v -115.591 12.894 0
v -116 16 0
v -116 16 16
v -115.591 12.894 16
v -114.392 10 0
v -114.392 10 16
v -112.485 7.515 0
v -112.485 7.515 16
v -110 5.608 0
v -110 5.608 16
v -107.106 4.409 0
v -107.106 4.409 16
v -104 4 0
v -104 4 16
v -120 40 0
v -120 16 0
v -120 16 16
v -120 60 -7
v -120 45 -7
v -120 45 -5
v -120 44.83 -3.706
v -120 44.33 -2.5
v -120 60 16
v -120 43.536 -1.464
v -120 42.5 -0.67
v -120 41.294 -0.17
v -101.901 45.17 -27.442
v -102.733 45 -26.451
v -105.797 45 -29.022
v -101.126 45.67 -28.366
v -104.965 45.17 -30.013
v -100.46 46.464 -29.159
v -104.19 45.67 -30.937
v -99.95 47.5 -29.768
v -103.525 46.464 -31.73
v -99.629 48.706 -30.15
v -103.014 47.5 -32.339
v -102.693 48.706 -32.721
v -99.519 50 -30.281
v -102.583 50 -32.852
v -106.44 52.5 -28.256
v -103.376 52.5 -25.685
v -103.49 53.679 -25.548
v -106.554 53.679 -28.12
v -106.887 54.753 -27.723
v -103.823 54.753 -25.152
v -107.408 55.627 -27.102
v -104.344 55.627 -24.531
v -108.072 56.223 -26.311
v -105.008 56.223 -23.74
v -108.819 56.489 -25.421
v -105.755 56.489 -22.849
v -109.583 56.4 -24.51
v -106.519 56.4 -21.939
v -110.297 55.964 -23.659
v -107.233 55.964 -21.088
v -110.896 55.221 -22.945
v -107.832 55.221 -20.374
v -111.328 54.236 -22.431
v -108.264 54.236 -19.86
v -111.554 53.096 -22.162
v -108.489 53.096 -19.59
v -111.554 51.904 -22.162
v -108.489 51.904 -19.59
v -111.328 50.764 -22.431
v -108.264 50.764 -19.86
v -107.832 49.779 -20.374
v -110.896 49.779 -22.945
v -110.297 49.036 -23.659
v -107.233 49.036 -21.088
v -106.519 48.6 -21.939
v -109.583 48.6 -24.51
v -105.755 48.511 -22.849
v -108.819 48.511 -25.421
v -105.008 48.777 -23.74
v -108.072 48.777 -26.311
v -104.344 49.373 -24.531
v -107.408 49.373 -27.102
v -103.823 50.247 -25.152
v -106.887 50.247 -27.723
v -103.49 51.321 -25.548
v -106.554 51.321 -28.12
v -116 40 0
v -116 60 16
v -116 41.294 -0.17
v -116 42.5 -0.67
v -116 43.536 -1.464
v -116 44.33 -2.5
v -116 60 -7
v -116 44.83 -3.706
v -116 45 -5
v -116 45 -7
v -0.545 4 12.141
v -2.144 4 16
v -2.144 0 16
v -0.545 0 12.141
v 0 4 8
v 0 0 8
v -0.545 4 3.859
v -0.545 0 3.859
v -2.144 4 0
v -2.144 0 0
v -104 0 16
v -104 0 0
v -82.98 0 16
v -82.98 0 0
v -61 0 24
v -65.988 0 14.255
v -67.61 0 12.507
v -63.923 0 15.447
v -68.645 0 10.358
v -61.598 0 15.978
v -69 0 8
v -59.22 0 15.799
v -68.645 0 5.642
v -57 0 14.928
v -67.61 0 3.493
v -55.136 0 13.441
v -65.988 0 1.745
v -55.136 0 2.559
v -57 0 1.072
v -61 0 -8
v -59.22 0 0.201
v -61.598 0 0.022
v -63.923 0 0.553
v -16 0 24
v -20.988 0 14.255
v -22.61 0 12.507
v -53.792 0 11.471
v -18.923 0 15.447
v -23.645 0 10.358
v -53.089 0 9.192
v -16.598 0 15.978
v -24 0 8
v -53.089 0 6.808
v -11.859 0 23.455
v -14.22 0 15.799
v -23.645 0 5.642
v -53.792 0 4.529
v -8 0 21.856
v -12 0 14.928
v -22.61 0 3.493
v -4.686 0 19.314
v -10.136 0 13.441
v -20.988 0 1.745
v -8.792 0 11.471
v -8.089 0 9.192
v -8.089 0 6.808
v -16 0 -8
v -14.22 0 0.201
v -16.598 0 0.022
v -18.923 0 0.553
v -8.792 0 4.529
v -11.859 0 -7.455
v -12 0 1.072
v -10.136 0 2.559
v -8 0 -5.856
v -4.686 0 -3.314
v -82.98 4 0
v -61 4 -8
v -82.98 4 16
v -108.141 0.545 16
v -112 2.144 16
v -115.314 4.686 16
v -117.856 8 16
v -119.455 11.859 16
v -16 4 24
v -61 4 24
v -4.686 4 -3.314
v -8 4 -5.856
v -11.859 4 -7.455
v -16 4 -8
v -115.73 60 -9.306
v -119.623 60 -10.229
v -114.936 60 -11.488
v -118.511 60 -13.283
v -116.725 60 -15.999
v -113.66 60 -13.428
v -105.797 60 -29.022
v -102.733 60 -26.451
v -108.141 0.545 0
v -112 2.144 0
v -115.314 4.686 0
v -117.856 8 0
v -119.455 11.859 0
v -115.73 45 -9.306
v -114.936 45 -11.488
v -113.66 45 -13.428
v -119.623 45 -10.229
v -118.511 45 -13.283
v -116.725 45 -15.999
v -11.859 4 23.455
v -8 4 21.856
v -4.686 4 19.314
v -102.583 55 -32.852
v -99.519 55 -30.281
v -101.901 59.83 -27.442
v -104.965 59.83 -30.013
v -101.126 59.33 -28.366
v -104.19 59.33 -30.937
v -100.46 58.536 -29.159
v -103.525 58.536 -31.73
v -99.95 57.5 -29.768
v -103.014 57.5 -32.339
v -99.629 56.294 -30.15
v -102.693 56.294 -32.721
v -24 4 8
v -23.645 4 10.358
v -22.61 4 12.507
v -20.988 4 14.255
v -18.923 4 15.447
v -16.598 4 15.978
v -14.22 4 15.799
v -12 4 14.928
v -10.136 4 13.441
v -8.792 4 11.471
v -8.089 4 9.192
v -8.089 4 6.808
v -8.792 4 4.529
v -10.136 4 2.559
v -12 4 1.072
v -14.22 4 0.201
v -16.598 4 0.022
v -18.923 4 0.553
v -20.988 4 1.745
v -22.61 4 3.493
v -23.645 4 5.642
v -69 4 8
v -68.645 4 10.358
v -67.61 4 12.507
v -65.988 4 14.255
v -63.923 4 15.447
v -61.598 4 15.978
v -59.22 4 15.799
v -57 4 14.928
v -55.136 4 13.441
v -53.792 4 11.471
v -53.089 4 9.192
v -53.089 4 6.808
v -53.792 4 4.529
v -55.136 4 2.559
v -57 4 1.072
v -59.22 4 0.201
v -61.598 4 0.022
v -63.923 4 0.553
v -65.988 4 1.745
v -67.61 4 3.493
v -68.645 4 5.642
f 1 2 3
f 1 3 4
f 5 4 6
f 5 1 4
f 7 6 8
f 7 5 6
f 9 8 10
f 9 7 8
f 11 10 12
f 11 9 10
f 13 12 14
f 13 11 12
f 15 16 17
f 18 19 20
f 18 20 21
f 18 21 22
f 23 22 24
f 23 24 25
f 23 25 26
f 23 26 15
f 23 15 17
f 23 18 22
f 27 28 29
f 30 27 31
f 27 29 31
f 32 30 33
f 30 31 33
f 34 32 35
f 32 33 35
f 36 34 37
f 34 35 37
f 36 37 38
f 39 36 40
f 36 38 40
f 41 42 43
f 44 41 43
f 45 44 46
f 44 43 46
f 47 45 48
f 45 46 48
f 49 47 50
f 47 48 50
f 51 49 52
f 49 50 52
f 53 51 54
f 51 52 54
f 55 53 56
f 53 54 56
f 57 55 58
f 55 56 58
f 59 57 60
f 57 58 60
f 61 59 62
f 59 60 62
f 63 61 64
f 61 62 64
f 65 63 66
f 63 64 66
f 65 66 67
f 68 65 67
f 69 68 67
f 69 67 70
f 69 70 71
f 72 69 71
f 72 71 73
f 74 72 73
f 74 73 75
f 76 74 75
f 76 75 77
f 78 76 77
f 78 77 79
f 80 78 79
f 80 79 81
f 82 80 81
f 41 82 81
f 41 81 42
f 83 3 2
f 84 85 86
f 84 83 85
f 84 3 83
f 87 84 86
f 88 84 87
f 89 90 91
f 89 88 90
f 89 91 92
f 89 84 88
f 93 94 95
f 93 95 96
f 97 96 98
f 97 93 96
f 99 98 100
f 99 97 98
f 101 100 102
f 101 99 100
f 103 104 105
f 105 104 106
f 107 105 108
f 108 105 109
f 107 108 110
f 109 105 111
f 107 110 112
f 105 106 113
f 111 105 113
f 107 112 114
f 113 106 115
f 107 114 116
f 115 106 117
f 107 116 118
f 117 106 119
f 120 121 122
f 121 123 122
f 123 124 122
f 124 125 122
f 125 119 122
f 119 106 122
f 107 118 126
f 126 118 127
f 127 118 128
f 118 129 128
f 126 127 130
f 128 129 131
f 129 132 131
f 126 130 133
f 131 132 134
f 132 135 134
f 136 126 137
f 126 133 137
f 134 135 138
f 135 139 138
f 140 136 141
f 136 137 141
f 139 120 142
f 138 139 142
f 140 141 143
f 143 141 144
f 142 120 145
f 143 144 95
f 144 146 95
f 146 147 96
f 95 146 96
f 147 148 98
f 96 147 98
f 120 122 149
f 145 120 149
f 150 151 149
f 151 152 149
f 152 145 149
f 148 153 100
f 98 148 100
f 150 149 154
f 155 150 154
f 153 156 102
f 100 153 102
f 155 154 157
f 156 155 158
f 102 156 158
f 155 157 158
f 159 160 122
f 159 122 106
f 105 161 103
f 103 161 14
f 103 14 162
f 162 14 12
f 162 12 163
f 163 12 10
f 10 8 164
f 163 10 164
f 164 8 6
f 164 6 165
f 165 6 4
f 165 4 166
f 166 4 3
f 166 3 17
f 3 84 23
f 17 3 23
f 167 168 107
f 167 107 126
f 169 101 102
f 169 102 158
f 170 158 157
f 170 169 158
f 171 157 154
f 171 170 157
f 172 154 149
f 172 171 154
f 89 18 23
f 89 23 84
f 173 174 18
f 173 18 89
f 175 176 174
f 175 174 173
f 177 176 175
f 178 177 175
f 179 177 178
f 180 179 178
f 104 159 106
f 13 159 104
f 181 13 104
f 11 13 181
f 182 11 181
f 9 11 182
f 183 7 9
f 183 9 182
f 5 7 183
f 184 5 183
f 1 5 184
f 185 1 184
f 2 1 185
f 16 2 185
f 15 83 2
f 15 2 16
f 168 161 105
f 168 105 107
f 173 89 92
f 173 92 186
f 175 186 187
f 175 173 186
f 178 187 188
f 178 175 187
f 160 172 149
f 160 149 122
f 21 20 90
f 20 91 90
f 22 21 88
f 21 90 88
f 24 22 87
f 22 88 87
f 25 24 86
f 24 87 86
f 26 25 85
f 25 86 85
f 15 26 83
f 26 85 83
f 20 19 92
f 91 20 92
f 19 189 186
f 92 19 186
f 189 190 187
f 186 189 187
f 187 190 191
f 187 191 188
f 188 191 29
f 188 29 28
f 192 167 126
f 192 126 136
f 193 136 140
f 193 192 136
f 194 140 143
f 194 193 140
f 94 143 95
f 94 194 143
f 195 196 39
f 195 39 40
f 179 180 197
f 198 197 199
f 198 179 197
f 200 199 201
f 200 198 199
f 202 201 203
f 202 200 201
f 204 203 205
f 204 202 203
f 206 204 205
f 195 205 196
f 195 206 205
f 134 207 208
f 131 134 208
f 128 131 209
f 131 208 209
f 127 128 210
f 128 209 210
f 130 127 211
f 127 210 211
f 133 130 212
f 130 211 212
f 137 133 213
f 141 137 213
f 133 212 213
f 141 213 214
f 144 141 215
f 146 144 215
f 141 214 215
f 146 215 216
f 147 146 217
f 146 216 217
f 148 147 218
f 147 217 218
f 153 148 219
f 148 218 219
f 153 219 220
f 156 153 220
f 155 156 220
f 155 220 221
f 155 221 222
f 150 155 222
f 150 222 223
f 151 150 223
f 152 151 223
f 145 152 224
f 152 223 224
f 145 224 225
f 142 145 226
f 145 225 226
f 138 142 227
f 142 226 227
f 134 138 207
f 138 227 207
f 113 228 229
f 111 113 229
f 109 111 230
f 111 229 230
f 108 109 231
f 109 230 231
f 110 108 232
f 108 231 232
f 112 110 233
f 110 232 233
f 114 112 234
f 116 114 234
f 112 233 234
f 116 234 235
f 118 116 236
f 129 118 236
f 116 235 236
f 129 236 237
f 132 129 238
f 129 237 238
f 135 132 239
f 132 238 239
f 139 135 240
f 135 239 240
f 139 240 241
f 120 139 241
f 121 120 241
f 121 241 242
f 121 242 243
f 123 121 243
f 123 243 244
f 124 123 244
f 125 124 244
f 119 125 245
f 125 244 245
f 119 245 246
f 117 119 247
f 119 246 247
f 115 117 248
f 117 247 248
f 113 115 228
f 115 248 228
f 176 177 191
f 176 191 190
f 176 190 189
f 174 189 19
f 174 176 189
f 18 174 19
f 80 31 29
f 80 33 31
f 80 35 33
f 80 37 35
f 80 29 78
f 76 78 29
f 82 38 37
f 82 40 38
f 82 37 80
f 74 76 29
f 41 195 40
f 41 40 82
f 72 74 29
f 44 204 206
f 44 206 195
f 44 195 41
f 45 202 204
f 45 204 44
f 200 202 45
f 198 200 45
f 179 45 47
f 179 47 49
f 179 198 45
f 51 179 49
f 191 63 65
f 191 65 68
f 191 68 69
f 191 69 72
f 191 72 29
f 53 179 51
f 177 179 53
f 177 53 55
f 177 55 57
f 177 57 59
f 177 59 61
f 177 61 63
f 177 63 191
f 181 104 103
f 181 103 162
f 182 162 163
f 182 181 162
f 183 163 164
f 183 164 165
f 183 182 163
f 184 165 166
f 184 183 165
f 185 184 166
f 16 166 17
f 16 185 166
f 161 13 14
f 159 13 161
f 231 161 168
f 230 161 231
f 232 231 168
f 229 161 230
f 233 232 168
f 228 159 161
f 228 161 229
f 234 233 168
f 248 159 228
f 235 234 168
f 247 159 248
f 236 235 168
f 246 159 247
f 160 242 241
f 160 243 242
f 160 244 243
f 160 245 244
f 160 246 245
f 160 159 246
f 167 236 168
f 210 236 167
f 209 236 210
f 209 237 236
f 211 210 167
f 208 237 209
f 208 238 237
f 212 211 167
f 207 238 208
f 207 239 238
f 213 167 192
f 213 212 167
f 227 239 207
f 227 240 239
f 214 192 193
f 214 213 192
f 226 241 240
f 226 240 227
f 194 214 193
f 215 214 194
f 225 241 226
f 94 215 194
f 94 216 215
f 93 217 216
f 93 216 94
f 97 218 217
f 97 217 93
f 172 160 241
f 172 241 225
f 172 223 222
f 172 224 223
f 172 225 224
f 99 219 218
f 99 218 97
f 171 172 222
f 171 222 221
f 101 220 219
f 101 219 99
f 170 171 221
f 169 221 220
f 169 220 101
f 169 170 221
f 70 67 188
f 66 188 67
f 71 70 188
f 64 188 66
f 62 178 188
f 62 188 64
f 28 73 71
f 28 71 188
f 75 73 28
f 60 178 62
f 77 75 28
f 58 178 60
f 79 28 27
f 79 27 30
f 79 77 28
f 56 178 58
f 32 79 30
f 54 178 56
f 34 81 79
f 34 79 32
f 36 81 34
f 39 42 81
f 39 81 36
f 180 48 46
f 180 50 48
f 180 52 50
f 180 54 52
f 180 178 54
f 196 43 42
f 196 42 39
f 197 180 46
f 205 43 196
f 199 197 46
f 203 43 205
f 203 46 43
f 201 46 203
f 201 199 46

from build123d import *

# Parameters (mm, degrees)
EXTRUDE_THIN1_DEPTH     = 16
SKETCH2_R               = 20
SKETCH2_R_2             = 16
CUT_EXTRUDE_THIN1_DEPTH = 10
BOSS_EXTRUDE1_DEPTH     = 4
SKETCH2_6_R             = 8
CUT_EXTRUDE1_DEPTH      = 4
EXTRUDE_THIN2_DEPTH     = 15
FILLET1_R               = 5
FILLET2_R               = 5
SKETCH5_R               = 4
CUT_EXTRUDE2_DEPTH      = 15


with BuildPart() as part:
    # Sketch1 → Extrude-Thin1 (new body)
    with BuildSketch(Plane.XY):
        with BuildLine():
            Line((0, 0), (-104, 0))
            ThreePointArc((-104, 0), (-115.313708499, 4.686291501), (-120, 16))
            Line((-120, 16), (-120, 60))
            Line((-120, 60), (-116, 60))
            Line((-116, 60), (-116, 16))
            ThreePointArc((-116, 16), (-112.485281374, 7.514718626), (-104, 4))
            Line((-104, 4), (0, 4))
            Line((0, 4), (0, 0))
        make_face()
    extrude(amount=EXTRUDE_THIN1_DEPTH)

    # Sketch2 → Cut-Extrude-Thin1 (cut)
    with BuildSketch(Plane(origin=(0, 4, 0), x_dir=(1, 0, 0), z_dir=(0, 1, 0))):
        with Locations((-16, -8)):
            Circle(SKETCH2_R)
        with Locations((-16, -8)):
            Circle(SKETCH2_R_2, mode=Mode.SUBTRACT)
    extrude(amount=-CUT_EXTRUDE_THIN1_DEPTH, mode=Mode.SUBTRACT)


with BuildPart() as cut_extrude_thin1_piece_1:
    # of the separate pieces the step leaves, piece 1, a body of its own (cut_extrude_thin1_pieces)
    add(part.part.solids().sort_by_distance((-104, 4, 0))[0])



with BuildPart() as cut_extrude_thin1_piece_2:
    # of the separate pieces the step leaves, piece 2, a body of its own (cut_extrude_thin1_pieces)
    add(part.part.solids().sort_by_distance((-29.856406461, 4, 0))[0])


with BuildPart() as cut_extrude_thin1_piece_1_1:
    add(cut_extrude_thin1_piece_1.part)

    add(cut_extrude_thin1_piece_2.part)  # Boss-Extrude1 merges Cut-Extrude-Thin1 piece 2
    # Sketch2<5> → Boss-Extrude1 (add)
    with BuildSketch(Plane(origin=(0, 4, 0), x_dir=(1, 0, 0), z_dir=(0, 1, 0))):
        with BuildLine():
            Line((-82.979819356, 0), (-61, 0))
            ThreePointArc((-61, 0), (-53, -8), (-61, -16))
            Line((-61, -16), (-82.979819356, -16))
            Line((-82.979819356, -16), (-61, -24))
            Line((-61, -24), (-16, -24))
            ThreePointArc((-16, -24), (-8, -21.856406461), (-2.143593539, -16))
            Line((-2.143593539, -16), (-16.000000062, -16))
            ThreePointArc((-16.000000062, -16), (-24, -7.999999969), (-16, 0))
            Line((-16, 0), (-2.143593539, 0))
            ThreePointArc((-2.143593539, 0), (-8, 5.856406461), (-16, 8))
            Line((-16, 8), (-61, 8))
            Line((-61, 8), (-82.979819356, 0))
        make_face()
    extrude(amount=-BOSS_EXTRUDE1_DEPTH)

    # Sketch2<6> → Cut-Extrude1 (cut)
    with BuildSketch(Plane(origin=(0, 4, 0), x_dir=(1, 0, 0), z_dir=(0, 1, 0))):
        with Locations((-61, -8)):
            Circle(SKETCH2_6_R)
        with Locations((-16, -8)):
            Circle(SKETCH2_6_R)
    extrude(amount=-CUT_EXTRUDE1_DEPTH, mode=Mode.SUBTRACT)

    # Sketch3 → Extrude-Thin2 (add)
    with BuildSketch(Plane(origin=(0, 60, 0), x_dir=(1, 0, 0), z_dir=(0, 1, 0))):
        with BuildLine():
            Line((-116, 0), (-116, 7))
            ThreePointArc((-116, 7), (-115.396926208, 10.420201433), (-113.660444431, 13.427876097))
            Line((-113.660444431, 13.427876097), (-99.519117018, 30.280853845))
            Line((-99.519117018, 30.280853845), (-102.583294791, 32.852004284))
            Line((-102.583294791, 32.852004284), (-116.724622204, 15.999026536))
            ThreePointArc((-116.724622204, 15.999026536), (-119.155696691, 11.788282007), (-120, 7))
            Line((-120, 7), (-120, 0))
            Line((-120, 0), (-116, 0))
        make_face()
    extrude(amount=-EXTRUDE_THIN2_DEPTH)

    # Fillet1
    fillet1_edges = [cut_extrude_thin1_piece_1_1.edges().sort_by_distance(p)[0] for p in [
        (-118, 45, 0),
    ]]
    fillet(fillet1_edges, radius=FILLET1_R)

    # Fillet2
    fillet2_edges = [cut_extrude_thin1_piece_1_1.edges().sort_by_distance(p)[0] for p in [
        (-101.051205904, 45, -31.566429065),
        (-101.051205904, 60, -31.566429065),
    ]]
    fillet(fillet2_edges, radius=FILLET2_R)

    # Sketch5 → Cut-Extrude2 (cut)
    with BuildSketch(Plane(origin=(-73.310624983, 0, -61.514918385), x_dir=(0.6427876096865427, 0, -0.7660444431189752), z_dir=(0.7660444431189752, 0, 0.6427876096865427))):
        with Locations((-50.773175525, 52.5)):
            Circle(SKETCH5_R)
    extrude(amount=-CUT_EXTRUDE2_DEPTH, mode=Mode.SUBTRACT)


solid = cut_extrude_thin1_piece_1_1.part
